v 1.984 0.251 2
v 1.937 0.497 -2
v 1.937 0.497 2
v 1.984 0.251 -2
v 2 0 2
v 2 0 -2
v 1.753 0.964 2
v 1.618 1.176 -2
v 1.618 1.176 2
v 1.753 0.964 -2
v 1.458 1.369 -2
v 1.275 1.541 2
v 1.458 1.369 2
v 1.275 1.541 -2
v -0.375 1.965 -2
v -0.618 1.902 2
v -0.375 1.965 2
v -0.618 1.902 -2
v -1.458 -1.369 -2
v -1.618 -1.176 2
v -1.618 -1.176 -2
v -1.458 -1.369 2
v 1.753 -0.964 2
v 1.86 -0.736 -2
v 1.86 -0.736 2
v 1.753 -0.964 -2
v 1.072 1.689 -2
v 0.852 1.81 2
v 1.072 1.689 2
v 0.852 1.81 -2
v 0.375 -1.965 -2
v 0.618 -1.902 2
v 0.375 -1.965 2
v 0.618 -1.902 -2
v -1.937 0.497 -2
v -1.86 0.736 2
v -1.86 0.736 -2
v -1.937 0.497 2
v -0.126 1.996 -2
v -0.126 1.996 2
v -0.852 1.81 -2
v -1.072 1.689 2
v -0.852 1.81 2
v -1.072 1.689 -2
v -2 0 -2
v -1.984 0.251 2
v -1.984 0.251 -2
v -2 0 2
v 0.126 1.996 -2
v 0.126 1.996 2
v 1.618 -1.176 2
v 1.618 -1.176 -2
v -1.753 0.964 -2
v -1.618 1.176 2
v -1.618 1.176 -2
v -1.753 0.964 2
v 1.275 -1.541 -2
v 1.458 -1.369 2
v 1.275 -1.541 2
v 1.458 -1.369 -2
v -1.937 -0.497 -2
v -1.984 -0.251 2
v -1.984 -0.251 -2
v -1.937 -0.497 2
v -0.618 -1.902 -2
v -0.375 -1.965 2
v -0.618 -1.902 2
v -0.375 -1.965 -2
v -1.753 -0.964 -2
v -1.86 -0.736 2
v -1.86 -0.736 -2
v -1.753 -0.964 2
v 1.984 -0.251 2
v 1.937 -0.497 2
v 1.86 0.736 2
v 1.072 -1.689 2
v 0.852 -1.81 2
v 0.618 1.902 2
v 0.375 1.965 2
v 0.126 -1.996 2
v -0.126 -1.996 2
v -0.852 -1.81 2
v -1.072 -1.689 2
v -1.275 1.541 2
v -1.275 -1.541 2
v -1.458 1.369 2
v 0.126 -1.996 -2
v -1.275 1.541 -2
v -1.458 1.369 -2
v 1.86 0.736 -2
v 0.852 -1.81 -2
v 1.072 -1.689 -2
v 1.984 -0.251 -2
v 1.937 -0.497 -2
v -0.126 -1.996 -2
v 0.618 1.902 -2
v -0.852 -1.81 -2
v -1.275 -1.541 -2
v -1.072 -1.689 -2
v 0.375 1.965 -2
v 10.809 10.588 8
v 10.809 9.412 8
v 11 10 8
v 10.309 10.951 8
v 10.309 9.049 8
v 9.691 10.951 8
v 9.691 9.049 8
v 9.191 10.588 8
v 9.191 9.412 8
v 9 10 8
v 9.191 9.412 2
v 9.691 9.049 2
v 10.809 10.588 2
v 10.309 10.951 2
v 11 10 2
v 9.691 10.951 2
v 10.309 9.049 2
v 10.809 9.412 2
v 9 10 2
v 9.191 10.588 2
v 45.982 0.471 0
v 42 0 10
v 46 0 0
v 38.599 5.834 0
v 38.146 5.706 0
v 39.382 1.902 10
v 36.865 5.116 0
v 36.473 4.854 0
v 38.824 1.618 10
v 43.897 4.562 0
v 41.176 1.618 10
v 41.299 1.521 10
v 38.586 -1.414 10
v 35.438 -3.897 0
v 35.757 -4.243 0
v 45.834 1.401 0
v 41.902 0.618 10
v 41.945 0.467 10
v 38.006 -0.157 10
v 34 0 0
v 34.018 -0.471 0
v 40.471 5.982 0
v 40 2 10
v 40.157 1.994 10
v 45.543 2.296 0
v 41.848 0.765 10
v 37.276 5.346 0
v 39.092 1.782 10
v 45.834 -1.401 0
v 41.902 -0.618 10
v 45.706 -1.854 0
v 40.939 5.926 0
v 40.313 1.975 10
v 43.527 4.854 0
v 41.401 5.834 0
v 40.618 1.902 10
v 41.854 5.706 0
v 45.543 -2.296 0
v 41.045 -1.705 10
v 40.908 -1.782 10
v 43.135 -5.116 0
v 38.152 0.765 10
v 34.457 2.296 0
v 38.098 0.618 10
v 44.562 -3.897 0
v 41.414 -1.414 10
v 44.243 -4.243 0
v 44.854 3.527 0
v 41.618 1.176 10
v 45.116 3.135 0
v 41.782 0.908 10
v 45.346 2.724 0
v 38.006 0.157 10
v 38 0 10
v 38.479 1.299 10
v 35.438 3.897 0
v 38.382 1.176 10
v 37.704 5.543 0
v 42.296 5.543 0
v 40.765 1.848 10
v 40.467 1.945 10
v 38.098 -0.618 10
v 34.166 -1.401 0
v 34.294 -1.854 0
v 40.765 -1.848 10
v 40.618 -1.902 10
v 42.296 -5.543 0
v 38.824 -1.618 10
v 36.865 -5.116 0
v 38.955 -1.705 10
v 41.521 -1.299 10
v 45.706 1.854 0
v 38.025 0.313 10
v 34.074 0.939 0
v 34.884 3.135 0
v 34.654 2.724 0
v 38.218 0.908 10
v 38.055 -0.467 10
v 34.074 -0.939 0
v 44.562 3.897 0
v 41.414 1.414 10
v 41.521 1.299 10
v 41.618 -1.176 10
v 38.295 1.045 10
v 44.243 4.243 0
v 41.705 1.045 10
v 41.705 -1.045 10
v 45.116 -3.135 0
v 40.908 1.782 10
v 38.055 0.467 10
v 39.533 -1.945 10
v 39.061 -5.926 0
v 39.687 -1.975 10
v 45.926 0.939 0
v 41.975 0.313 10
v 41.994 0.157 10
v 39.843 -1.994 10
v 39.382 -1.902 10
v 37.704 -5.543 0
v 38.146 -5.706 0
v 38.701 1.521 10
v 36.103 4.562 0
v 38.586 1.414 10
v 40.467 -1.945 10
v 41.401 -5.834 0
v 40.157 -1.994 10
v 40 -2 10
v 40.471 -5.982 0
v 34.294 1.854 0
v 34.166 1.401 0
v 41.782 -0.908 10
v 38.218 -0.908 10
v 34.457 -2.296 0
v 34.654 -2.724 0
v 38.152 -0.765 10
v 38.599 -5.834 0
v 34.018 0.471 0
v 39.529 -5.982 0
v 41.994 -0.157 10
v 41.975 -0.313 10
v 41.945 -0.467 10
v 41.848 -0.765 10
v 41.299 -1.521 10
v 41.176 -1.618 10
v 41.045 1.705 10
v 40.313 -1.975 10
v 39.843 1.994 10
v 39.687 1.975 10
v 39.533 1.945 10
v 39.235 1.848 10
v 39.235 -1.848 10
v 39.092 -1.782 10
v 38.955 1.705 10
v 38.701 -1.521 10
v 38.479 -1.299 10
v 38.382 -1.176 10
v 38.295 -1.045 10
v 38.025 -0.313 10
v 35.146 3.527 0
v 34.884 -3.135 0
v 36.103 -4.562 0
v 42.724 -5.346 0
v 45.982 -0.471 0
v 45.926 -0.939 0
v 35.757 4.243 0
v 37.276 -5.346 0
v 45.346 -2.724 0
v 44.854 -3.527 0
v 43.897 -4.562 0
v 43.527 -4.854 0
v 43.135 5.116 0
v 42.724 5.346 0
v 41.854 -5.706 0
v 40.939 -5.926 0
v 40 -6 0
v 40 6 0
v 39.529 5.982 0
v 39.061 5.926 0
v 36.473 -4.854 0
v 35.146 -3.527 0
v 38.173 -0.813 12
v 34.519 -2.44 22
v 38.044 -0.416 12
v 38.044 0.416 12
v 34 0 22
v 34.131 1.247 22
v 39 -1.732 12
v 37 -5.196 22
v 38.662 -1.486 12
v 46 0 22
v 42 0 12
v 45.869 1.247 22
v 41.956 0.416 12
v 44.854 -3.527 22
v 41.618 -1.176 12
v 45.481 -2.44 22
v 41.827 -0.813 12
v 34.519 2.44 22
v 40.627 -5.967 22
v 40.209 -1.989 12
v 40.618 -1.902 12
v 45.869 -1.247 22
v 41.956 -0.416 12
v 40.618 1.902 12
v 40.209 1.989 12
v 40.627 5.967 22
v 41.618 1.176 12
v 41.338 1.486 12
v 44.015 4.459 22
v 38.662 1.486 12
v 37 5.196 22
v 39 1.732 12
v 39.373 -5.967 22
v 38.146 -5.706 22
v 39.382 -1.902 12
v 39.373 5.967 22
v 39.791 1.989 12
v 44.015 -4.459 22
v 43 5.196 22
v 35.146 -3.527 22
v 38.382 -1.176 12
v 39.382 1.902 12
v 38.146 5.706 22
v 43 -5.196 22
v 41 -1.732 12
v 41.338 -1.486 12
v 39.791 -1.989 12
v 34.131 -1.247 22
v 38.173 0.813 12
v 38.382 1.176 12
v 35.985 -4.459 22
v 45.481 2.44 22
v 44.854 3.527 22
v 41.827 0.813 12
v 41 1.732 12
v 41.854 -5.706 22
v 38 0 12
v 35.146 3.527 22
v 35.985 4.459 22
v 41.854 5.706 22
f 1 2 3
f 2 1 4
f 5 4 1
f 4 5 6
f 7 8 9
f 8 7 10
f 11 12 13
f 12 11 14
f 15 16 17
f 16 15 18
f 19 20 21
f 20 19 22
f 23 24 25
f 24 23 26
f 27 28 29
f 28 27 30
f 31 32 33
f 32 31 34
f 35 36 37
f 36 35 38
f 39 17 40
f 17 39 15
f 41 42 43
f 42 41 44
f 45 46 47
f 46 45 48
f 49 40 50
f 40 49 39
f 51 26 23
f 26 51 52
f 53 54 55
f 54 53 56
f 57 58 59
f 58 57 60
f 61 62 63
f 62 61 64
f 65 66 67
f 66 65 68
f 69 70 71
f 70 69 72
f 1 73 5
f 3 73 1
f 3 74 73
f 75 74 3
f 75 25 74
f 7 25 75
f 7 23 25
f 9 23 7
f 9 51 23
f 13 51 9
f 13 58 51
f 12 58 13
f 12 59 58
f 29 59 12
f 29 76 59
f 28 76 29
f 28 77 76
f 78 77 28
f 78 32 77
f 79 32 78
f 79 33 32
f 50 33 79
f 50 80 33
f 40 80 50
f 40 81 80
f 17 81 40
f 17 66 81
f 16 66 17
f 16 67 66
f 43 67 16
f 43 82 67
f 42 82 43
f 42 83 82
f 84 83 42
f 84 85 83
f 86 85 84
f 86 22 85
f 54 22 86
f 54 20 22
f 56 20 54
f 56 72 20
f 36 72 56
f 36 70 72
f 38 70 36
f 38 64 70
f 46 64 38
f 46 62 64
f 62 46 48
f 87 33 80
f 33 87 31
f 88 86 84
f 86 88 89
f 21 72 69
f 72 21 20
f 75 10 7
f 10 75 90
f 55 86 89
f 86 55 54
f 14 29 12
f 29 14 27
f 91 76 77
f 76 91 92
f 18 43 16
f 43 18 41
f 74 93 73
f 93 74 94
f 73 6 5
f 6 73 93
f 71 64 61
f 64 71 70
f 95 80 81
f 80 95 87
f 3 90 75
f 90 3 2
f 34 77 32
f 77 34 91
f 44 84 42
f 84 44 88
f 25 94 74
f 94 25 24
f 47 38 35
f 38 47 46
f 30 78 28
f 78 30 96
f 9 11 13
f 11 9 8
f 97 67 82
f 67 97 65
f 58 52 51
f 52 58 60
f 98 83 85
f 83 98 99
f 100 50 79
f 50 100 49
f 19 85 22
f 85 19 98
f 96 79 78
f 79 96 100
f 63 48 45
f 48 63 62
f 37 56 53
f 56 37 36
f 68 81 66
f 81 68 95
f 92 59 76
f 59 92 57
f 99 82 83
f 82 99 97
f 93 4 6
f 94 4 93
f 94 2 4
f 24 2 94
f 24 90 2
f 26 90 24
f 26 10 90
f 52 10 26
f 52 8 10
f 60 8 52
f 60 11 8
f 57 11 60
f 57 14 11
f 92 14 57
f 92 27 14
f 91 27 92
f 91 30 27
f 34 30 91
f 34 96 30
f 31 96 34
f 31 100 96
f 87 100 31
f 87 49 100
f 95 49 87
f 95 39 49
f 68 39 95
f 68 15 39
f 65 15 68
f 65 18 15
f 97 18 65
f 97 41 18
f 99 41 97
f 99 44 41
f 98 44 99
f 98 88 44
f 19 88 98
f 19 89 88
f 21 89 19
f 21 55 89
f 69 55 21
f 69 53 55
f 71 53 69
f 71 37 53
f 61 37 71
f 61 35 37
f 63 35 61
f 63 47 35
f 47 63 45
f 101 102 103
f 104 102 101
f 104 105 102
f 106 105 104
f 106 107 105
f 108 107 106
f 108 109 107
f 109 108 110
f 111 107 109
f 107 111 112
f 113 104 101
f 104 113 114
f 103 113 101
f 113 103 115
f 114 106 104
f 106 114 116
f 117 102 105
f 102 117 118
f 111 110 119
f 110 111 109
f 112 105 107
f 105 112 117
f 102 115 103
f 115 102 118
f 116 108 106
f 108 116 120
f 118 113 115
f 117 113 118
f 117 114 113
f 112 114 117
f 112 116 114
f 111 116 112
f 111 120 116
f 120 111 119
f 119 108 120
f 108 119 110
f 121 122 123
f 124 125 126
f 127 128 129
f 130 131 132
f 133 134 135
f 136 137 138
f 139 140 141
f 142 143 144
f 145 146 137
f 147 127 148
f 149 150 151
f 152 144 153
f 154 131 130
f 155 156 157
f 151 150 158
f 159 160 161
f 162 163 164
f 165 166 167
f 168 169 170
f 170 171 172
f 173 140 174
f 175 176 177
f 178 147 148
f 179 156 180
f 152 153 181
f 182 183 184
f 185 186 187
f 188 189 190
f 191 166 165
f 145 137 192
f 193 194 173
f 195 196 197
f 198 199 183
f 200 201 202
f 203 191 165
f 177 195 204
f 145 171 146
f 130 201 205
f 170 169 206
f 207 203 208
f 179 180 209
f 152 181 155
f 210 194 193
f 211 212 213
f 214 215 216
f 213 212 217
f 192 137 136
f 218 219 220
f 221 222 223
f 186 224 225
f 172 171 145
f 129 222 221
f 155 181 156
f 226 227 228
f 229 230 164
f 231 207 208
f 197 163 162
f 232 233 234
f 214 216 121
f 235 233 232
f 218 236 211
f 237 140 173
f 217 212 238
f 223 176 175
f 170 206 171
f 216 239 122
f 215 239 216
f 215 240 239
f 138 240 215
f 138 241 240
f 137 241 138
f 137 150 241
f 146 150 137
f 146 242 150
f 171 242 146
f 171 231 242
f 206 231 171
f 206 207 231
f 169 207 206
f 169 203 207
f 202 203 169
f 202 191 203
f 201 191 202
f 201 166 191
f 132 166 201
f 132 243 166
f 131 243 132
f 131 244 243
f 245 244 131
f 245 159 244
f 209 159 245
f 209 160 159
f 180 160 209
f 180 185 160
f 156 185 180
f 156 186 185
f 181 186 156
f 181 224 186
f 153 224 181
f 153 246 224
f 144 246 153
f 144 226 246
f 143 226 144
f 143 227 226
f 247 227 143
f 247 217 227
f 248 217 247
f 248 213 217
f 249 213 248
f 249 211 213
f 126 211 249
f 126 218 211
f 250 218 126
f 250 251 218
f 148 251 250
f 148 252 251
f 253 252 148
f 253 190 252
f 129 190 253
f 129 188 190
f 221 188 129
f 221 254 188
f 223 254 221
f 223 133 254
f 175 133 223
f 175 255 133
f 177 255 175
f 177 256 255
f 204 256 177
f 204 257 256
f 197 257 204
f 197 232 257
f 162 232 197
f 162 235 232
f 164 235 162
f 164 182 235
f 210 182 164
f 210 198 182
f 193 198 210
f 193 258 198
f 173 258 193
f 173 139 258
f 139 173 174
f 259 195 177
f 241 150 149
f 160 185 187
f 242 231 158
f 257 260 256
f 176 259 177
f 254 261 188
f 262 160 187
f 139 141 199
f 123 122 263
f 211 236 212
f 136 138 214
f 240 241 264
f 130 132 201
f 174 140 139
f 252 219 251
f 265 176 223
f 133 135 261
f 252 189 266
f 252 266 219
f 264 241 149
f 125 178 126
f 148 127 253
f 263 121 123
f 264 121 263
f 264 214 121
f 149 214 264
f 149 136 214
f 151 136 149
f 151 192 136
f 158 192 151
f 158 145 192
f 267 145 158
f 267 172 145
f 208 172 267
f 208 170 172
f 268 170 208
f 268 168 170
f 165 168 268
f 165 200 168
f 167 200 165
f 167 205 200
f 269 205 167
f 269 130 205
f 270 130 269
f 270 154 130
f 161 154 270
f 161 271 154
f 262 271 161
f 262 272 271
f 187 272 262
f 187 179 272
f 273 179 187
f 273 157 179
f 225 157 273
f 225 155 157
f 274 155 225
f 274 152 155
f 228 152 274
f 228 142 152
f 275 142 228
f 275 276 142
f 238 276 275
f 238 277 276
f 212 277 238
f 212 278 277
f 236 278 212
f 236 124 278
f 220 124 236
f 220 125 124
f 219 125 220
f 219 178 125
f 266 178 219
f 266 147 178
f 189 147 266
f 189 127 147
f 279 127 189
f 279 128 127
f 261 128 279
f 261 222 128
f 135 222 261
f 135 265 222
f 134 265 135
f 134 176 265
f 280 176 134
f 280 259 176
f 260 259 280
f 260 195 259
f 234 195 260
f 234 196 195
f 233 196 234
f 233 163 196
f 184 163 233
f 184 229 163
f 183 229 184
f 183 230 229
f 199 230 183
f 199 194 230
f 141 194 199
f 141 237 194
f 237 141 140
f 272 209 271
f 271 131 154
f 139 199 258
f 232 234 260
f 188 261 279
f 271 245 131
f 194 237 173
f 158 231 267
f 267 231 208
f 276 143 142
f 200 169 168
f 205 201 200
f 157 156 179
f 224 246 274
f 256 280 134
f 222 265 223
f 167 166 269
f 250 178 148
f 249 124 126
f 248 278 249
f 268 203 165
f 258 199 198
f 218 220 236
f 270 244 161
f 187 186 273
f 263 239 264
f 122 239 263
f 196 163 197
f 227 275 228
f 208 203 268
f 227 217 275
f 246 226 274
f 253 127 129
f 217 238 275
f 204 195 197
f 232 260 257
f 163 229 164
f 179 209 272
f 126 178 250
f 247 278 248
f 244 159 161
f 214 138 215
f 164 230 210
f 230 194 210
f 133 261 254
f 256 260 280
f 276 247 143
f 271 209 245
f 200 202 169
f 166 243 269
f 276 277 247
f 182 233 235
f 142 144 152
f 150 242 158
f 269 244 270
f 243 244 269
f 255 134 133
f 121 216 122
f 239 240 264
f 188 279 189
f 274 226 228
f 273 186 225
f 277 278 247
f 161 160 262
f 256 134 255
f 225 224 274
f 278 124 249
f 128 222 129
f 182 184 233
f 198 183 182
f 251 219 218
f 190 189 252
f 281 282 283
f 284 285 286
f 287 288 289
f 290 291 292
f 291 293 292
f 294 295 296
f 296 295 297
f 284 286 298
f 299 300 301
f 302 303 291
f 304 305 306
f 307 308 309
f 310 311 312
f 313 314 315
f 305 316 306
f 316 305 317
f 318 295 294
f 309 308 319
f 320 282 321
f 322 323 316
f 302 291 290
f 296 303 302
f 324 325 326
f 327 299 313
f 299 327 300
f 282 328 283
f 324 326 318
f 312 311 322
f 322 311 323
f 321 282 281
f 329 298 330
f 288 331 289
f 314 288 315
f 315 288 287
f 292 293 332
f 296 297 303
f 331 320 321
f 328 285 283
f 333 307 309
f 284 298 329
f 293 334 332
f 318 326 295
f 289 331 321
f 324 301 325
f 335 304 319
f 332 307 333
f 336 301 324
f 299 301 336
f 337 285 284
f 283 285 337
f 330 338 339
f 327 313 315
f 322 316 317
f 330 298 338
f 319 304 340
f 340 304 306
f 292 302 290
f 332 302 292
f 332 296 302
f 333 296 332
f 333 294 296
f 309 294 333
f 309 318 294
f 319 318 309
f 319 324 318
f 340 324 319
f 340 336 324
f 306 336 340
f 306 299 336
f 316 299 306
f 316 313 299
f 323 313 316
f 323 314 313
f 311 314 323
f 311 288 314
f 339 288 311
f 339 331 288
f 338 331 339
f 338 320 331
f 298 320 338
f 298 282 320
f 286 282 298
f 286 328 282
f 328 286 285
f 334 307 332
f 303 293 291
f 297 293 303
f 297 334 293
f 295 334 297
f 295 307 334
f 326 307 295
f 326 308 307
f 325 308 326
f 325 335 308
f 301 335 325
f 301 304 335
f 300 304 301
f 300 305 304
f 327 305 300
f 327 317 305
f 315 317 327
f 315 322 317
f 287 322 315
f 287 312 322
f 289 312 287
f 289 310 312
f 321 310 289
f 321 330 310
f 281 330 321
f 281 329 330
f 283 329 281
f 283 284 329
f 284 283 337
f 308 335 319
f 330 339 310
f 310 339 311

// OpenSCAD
/*

Sage Ridge Robotics OpenSCAD file.
Christopher von Nagy, July 2014.

Example 02 cylinders.

Usage: The circle_of_columns() module takes
one variable, the angle between each column.


*/


// Cylinders
// We use the cylinder command to construct cylindrical objects.
// Note how $fn controls the number of faces (smoothness) of the
// object
translate([0,0,0]) cylinder(r=2,h=4, center=true, $fn=50);
translate([10,10,5]) cylinder(r=1,h=6, center=true, $fn=10);

// We'll set the default $fn to 30 for now
$fn=30;

// cylinder() can be used to draw conical objects by setting
// each of the two associated radii to a differnt value
translate([40,0,0]) cylinder(r1=6,r2=2,h=10, $fn=80);
translate([40,0,12]) cylinder(r1=2, r2=6,h=10);

/*

License code:

Creative Commons Atribution 4.0

Attribution — You must give appropriate credit, provide a link to the license, and indicate if changes were made. You may do so in any reasonable manner, but not in any way that suggests the licensor endorses you or your use.

No additional restrictions — You may not apply legal terms or technological measures that legally restrict others from doing anything the license permits.


*/
